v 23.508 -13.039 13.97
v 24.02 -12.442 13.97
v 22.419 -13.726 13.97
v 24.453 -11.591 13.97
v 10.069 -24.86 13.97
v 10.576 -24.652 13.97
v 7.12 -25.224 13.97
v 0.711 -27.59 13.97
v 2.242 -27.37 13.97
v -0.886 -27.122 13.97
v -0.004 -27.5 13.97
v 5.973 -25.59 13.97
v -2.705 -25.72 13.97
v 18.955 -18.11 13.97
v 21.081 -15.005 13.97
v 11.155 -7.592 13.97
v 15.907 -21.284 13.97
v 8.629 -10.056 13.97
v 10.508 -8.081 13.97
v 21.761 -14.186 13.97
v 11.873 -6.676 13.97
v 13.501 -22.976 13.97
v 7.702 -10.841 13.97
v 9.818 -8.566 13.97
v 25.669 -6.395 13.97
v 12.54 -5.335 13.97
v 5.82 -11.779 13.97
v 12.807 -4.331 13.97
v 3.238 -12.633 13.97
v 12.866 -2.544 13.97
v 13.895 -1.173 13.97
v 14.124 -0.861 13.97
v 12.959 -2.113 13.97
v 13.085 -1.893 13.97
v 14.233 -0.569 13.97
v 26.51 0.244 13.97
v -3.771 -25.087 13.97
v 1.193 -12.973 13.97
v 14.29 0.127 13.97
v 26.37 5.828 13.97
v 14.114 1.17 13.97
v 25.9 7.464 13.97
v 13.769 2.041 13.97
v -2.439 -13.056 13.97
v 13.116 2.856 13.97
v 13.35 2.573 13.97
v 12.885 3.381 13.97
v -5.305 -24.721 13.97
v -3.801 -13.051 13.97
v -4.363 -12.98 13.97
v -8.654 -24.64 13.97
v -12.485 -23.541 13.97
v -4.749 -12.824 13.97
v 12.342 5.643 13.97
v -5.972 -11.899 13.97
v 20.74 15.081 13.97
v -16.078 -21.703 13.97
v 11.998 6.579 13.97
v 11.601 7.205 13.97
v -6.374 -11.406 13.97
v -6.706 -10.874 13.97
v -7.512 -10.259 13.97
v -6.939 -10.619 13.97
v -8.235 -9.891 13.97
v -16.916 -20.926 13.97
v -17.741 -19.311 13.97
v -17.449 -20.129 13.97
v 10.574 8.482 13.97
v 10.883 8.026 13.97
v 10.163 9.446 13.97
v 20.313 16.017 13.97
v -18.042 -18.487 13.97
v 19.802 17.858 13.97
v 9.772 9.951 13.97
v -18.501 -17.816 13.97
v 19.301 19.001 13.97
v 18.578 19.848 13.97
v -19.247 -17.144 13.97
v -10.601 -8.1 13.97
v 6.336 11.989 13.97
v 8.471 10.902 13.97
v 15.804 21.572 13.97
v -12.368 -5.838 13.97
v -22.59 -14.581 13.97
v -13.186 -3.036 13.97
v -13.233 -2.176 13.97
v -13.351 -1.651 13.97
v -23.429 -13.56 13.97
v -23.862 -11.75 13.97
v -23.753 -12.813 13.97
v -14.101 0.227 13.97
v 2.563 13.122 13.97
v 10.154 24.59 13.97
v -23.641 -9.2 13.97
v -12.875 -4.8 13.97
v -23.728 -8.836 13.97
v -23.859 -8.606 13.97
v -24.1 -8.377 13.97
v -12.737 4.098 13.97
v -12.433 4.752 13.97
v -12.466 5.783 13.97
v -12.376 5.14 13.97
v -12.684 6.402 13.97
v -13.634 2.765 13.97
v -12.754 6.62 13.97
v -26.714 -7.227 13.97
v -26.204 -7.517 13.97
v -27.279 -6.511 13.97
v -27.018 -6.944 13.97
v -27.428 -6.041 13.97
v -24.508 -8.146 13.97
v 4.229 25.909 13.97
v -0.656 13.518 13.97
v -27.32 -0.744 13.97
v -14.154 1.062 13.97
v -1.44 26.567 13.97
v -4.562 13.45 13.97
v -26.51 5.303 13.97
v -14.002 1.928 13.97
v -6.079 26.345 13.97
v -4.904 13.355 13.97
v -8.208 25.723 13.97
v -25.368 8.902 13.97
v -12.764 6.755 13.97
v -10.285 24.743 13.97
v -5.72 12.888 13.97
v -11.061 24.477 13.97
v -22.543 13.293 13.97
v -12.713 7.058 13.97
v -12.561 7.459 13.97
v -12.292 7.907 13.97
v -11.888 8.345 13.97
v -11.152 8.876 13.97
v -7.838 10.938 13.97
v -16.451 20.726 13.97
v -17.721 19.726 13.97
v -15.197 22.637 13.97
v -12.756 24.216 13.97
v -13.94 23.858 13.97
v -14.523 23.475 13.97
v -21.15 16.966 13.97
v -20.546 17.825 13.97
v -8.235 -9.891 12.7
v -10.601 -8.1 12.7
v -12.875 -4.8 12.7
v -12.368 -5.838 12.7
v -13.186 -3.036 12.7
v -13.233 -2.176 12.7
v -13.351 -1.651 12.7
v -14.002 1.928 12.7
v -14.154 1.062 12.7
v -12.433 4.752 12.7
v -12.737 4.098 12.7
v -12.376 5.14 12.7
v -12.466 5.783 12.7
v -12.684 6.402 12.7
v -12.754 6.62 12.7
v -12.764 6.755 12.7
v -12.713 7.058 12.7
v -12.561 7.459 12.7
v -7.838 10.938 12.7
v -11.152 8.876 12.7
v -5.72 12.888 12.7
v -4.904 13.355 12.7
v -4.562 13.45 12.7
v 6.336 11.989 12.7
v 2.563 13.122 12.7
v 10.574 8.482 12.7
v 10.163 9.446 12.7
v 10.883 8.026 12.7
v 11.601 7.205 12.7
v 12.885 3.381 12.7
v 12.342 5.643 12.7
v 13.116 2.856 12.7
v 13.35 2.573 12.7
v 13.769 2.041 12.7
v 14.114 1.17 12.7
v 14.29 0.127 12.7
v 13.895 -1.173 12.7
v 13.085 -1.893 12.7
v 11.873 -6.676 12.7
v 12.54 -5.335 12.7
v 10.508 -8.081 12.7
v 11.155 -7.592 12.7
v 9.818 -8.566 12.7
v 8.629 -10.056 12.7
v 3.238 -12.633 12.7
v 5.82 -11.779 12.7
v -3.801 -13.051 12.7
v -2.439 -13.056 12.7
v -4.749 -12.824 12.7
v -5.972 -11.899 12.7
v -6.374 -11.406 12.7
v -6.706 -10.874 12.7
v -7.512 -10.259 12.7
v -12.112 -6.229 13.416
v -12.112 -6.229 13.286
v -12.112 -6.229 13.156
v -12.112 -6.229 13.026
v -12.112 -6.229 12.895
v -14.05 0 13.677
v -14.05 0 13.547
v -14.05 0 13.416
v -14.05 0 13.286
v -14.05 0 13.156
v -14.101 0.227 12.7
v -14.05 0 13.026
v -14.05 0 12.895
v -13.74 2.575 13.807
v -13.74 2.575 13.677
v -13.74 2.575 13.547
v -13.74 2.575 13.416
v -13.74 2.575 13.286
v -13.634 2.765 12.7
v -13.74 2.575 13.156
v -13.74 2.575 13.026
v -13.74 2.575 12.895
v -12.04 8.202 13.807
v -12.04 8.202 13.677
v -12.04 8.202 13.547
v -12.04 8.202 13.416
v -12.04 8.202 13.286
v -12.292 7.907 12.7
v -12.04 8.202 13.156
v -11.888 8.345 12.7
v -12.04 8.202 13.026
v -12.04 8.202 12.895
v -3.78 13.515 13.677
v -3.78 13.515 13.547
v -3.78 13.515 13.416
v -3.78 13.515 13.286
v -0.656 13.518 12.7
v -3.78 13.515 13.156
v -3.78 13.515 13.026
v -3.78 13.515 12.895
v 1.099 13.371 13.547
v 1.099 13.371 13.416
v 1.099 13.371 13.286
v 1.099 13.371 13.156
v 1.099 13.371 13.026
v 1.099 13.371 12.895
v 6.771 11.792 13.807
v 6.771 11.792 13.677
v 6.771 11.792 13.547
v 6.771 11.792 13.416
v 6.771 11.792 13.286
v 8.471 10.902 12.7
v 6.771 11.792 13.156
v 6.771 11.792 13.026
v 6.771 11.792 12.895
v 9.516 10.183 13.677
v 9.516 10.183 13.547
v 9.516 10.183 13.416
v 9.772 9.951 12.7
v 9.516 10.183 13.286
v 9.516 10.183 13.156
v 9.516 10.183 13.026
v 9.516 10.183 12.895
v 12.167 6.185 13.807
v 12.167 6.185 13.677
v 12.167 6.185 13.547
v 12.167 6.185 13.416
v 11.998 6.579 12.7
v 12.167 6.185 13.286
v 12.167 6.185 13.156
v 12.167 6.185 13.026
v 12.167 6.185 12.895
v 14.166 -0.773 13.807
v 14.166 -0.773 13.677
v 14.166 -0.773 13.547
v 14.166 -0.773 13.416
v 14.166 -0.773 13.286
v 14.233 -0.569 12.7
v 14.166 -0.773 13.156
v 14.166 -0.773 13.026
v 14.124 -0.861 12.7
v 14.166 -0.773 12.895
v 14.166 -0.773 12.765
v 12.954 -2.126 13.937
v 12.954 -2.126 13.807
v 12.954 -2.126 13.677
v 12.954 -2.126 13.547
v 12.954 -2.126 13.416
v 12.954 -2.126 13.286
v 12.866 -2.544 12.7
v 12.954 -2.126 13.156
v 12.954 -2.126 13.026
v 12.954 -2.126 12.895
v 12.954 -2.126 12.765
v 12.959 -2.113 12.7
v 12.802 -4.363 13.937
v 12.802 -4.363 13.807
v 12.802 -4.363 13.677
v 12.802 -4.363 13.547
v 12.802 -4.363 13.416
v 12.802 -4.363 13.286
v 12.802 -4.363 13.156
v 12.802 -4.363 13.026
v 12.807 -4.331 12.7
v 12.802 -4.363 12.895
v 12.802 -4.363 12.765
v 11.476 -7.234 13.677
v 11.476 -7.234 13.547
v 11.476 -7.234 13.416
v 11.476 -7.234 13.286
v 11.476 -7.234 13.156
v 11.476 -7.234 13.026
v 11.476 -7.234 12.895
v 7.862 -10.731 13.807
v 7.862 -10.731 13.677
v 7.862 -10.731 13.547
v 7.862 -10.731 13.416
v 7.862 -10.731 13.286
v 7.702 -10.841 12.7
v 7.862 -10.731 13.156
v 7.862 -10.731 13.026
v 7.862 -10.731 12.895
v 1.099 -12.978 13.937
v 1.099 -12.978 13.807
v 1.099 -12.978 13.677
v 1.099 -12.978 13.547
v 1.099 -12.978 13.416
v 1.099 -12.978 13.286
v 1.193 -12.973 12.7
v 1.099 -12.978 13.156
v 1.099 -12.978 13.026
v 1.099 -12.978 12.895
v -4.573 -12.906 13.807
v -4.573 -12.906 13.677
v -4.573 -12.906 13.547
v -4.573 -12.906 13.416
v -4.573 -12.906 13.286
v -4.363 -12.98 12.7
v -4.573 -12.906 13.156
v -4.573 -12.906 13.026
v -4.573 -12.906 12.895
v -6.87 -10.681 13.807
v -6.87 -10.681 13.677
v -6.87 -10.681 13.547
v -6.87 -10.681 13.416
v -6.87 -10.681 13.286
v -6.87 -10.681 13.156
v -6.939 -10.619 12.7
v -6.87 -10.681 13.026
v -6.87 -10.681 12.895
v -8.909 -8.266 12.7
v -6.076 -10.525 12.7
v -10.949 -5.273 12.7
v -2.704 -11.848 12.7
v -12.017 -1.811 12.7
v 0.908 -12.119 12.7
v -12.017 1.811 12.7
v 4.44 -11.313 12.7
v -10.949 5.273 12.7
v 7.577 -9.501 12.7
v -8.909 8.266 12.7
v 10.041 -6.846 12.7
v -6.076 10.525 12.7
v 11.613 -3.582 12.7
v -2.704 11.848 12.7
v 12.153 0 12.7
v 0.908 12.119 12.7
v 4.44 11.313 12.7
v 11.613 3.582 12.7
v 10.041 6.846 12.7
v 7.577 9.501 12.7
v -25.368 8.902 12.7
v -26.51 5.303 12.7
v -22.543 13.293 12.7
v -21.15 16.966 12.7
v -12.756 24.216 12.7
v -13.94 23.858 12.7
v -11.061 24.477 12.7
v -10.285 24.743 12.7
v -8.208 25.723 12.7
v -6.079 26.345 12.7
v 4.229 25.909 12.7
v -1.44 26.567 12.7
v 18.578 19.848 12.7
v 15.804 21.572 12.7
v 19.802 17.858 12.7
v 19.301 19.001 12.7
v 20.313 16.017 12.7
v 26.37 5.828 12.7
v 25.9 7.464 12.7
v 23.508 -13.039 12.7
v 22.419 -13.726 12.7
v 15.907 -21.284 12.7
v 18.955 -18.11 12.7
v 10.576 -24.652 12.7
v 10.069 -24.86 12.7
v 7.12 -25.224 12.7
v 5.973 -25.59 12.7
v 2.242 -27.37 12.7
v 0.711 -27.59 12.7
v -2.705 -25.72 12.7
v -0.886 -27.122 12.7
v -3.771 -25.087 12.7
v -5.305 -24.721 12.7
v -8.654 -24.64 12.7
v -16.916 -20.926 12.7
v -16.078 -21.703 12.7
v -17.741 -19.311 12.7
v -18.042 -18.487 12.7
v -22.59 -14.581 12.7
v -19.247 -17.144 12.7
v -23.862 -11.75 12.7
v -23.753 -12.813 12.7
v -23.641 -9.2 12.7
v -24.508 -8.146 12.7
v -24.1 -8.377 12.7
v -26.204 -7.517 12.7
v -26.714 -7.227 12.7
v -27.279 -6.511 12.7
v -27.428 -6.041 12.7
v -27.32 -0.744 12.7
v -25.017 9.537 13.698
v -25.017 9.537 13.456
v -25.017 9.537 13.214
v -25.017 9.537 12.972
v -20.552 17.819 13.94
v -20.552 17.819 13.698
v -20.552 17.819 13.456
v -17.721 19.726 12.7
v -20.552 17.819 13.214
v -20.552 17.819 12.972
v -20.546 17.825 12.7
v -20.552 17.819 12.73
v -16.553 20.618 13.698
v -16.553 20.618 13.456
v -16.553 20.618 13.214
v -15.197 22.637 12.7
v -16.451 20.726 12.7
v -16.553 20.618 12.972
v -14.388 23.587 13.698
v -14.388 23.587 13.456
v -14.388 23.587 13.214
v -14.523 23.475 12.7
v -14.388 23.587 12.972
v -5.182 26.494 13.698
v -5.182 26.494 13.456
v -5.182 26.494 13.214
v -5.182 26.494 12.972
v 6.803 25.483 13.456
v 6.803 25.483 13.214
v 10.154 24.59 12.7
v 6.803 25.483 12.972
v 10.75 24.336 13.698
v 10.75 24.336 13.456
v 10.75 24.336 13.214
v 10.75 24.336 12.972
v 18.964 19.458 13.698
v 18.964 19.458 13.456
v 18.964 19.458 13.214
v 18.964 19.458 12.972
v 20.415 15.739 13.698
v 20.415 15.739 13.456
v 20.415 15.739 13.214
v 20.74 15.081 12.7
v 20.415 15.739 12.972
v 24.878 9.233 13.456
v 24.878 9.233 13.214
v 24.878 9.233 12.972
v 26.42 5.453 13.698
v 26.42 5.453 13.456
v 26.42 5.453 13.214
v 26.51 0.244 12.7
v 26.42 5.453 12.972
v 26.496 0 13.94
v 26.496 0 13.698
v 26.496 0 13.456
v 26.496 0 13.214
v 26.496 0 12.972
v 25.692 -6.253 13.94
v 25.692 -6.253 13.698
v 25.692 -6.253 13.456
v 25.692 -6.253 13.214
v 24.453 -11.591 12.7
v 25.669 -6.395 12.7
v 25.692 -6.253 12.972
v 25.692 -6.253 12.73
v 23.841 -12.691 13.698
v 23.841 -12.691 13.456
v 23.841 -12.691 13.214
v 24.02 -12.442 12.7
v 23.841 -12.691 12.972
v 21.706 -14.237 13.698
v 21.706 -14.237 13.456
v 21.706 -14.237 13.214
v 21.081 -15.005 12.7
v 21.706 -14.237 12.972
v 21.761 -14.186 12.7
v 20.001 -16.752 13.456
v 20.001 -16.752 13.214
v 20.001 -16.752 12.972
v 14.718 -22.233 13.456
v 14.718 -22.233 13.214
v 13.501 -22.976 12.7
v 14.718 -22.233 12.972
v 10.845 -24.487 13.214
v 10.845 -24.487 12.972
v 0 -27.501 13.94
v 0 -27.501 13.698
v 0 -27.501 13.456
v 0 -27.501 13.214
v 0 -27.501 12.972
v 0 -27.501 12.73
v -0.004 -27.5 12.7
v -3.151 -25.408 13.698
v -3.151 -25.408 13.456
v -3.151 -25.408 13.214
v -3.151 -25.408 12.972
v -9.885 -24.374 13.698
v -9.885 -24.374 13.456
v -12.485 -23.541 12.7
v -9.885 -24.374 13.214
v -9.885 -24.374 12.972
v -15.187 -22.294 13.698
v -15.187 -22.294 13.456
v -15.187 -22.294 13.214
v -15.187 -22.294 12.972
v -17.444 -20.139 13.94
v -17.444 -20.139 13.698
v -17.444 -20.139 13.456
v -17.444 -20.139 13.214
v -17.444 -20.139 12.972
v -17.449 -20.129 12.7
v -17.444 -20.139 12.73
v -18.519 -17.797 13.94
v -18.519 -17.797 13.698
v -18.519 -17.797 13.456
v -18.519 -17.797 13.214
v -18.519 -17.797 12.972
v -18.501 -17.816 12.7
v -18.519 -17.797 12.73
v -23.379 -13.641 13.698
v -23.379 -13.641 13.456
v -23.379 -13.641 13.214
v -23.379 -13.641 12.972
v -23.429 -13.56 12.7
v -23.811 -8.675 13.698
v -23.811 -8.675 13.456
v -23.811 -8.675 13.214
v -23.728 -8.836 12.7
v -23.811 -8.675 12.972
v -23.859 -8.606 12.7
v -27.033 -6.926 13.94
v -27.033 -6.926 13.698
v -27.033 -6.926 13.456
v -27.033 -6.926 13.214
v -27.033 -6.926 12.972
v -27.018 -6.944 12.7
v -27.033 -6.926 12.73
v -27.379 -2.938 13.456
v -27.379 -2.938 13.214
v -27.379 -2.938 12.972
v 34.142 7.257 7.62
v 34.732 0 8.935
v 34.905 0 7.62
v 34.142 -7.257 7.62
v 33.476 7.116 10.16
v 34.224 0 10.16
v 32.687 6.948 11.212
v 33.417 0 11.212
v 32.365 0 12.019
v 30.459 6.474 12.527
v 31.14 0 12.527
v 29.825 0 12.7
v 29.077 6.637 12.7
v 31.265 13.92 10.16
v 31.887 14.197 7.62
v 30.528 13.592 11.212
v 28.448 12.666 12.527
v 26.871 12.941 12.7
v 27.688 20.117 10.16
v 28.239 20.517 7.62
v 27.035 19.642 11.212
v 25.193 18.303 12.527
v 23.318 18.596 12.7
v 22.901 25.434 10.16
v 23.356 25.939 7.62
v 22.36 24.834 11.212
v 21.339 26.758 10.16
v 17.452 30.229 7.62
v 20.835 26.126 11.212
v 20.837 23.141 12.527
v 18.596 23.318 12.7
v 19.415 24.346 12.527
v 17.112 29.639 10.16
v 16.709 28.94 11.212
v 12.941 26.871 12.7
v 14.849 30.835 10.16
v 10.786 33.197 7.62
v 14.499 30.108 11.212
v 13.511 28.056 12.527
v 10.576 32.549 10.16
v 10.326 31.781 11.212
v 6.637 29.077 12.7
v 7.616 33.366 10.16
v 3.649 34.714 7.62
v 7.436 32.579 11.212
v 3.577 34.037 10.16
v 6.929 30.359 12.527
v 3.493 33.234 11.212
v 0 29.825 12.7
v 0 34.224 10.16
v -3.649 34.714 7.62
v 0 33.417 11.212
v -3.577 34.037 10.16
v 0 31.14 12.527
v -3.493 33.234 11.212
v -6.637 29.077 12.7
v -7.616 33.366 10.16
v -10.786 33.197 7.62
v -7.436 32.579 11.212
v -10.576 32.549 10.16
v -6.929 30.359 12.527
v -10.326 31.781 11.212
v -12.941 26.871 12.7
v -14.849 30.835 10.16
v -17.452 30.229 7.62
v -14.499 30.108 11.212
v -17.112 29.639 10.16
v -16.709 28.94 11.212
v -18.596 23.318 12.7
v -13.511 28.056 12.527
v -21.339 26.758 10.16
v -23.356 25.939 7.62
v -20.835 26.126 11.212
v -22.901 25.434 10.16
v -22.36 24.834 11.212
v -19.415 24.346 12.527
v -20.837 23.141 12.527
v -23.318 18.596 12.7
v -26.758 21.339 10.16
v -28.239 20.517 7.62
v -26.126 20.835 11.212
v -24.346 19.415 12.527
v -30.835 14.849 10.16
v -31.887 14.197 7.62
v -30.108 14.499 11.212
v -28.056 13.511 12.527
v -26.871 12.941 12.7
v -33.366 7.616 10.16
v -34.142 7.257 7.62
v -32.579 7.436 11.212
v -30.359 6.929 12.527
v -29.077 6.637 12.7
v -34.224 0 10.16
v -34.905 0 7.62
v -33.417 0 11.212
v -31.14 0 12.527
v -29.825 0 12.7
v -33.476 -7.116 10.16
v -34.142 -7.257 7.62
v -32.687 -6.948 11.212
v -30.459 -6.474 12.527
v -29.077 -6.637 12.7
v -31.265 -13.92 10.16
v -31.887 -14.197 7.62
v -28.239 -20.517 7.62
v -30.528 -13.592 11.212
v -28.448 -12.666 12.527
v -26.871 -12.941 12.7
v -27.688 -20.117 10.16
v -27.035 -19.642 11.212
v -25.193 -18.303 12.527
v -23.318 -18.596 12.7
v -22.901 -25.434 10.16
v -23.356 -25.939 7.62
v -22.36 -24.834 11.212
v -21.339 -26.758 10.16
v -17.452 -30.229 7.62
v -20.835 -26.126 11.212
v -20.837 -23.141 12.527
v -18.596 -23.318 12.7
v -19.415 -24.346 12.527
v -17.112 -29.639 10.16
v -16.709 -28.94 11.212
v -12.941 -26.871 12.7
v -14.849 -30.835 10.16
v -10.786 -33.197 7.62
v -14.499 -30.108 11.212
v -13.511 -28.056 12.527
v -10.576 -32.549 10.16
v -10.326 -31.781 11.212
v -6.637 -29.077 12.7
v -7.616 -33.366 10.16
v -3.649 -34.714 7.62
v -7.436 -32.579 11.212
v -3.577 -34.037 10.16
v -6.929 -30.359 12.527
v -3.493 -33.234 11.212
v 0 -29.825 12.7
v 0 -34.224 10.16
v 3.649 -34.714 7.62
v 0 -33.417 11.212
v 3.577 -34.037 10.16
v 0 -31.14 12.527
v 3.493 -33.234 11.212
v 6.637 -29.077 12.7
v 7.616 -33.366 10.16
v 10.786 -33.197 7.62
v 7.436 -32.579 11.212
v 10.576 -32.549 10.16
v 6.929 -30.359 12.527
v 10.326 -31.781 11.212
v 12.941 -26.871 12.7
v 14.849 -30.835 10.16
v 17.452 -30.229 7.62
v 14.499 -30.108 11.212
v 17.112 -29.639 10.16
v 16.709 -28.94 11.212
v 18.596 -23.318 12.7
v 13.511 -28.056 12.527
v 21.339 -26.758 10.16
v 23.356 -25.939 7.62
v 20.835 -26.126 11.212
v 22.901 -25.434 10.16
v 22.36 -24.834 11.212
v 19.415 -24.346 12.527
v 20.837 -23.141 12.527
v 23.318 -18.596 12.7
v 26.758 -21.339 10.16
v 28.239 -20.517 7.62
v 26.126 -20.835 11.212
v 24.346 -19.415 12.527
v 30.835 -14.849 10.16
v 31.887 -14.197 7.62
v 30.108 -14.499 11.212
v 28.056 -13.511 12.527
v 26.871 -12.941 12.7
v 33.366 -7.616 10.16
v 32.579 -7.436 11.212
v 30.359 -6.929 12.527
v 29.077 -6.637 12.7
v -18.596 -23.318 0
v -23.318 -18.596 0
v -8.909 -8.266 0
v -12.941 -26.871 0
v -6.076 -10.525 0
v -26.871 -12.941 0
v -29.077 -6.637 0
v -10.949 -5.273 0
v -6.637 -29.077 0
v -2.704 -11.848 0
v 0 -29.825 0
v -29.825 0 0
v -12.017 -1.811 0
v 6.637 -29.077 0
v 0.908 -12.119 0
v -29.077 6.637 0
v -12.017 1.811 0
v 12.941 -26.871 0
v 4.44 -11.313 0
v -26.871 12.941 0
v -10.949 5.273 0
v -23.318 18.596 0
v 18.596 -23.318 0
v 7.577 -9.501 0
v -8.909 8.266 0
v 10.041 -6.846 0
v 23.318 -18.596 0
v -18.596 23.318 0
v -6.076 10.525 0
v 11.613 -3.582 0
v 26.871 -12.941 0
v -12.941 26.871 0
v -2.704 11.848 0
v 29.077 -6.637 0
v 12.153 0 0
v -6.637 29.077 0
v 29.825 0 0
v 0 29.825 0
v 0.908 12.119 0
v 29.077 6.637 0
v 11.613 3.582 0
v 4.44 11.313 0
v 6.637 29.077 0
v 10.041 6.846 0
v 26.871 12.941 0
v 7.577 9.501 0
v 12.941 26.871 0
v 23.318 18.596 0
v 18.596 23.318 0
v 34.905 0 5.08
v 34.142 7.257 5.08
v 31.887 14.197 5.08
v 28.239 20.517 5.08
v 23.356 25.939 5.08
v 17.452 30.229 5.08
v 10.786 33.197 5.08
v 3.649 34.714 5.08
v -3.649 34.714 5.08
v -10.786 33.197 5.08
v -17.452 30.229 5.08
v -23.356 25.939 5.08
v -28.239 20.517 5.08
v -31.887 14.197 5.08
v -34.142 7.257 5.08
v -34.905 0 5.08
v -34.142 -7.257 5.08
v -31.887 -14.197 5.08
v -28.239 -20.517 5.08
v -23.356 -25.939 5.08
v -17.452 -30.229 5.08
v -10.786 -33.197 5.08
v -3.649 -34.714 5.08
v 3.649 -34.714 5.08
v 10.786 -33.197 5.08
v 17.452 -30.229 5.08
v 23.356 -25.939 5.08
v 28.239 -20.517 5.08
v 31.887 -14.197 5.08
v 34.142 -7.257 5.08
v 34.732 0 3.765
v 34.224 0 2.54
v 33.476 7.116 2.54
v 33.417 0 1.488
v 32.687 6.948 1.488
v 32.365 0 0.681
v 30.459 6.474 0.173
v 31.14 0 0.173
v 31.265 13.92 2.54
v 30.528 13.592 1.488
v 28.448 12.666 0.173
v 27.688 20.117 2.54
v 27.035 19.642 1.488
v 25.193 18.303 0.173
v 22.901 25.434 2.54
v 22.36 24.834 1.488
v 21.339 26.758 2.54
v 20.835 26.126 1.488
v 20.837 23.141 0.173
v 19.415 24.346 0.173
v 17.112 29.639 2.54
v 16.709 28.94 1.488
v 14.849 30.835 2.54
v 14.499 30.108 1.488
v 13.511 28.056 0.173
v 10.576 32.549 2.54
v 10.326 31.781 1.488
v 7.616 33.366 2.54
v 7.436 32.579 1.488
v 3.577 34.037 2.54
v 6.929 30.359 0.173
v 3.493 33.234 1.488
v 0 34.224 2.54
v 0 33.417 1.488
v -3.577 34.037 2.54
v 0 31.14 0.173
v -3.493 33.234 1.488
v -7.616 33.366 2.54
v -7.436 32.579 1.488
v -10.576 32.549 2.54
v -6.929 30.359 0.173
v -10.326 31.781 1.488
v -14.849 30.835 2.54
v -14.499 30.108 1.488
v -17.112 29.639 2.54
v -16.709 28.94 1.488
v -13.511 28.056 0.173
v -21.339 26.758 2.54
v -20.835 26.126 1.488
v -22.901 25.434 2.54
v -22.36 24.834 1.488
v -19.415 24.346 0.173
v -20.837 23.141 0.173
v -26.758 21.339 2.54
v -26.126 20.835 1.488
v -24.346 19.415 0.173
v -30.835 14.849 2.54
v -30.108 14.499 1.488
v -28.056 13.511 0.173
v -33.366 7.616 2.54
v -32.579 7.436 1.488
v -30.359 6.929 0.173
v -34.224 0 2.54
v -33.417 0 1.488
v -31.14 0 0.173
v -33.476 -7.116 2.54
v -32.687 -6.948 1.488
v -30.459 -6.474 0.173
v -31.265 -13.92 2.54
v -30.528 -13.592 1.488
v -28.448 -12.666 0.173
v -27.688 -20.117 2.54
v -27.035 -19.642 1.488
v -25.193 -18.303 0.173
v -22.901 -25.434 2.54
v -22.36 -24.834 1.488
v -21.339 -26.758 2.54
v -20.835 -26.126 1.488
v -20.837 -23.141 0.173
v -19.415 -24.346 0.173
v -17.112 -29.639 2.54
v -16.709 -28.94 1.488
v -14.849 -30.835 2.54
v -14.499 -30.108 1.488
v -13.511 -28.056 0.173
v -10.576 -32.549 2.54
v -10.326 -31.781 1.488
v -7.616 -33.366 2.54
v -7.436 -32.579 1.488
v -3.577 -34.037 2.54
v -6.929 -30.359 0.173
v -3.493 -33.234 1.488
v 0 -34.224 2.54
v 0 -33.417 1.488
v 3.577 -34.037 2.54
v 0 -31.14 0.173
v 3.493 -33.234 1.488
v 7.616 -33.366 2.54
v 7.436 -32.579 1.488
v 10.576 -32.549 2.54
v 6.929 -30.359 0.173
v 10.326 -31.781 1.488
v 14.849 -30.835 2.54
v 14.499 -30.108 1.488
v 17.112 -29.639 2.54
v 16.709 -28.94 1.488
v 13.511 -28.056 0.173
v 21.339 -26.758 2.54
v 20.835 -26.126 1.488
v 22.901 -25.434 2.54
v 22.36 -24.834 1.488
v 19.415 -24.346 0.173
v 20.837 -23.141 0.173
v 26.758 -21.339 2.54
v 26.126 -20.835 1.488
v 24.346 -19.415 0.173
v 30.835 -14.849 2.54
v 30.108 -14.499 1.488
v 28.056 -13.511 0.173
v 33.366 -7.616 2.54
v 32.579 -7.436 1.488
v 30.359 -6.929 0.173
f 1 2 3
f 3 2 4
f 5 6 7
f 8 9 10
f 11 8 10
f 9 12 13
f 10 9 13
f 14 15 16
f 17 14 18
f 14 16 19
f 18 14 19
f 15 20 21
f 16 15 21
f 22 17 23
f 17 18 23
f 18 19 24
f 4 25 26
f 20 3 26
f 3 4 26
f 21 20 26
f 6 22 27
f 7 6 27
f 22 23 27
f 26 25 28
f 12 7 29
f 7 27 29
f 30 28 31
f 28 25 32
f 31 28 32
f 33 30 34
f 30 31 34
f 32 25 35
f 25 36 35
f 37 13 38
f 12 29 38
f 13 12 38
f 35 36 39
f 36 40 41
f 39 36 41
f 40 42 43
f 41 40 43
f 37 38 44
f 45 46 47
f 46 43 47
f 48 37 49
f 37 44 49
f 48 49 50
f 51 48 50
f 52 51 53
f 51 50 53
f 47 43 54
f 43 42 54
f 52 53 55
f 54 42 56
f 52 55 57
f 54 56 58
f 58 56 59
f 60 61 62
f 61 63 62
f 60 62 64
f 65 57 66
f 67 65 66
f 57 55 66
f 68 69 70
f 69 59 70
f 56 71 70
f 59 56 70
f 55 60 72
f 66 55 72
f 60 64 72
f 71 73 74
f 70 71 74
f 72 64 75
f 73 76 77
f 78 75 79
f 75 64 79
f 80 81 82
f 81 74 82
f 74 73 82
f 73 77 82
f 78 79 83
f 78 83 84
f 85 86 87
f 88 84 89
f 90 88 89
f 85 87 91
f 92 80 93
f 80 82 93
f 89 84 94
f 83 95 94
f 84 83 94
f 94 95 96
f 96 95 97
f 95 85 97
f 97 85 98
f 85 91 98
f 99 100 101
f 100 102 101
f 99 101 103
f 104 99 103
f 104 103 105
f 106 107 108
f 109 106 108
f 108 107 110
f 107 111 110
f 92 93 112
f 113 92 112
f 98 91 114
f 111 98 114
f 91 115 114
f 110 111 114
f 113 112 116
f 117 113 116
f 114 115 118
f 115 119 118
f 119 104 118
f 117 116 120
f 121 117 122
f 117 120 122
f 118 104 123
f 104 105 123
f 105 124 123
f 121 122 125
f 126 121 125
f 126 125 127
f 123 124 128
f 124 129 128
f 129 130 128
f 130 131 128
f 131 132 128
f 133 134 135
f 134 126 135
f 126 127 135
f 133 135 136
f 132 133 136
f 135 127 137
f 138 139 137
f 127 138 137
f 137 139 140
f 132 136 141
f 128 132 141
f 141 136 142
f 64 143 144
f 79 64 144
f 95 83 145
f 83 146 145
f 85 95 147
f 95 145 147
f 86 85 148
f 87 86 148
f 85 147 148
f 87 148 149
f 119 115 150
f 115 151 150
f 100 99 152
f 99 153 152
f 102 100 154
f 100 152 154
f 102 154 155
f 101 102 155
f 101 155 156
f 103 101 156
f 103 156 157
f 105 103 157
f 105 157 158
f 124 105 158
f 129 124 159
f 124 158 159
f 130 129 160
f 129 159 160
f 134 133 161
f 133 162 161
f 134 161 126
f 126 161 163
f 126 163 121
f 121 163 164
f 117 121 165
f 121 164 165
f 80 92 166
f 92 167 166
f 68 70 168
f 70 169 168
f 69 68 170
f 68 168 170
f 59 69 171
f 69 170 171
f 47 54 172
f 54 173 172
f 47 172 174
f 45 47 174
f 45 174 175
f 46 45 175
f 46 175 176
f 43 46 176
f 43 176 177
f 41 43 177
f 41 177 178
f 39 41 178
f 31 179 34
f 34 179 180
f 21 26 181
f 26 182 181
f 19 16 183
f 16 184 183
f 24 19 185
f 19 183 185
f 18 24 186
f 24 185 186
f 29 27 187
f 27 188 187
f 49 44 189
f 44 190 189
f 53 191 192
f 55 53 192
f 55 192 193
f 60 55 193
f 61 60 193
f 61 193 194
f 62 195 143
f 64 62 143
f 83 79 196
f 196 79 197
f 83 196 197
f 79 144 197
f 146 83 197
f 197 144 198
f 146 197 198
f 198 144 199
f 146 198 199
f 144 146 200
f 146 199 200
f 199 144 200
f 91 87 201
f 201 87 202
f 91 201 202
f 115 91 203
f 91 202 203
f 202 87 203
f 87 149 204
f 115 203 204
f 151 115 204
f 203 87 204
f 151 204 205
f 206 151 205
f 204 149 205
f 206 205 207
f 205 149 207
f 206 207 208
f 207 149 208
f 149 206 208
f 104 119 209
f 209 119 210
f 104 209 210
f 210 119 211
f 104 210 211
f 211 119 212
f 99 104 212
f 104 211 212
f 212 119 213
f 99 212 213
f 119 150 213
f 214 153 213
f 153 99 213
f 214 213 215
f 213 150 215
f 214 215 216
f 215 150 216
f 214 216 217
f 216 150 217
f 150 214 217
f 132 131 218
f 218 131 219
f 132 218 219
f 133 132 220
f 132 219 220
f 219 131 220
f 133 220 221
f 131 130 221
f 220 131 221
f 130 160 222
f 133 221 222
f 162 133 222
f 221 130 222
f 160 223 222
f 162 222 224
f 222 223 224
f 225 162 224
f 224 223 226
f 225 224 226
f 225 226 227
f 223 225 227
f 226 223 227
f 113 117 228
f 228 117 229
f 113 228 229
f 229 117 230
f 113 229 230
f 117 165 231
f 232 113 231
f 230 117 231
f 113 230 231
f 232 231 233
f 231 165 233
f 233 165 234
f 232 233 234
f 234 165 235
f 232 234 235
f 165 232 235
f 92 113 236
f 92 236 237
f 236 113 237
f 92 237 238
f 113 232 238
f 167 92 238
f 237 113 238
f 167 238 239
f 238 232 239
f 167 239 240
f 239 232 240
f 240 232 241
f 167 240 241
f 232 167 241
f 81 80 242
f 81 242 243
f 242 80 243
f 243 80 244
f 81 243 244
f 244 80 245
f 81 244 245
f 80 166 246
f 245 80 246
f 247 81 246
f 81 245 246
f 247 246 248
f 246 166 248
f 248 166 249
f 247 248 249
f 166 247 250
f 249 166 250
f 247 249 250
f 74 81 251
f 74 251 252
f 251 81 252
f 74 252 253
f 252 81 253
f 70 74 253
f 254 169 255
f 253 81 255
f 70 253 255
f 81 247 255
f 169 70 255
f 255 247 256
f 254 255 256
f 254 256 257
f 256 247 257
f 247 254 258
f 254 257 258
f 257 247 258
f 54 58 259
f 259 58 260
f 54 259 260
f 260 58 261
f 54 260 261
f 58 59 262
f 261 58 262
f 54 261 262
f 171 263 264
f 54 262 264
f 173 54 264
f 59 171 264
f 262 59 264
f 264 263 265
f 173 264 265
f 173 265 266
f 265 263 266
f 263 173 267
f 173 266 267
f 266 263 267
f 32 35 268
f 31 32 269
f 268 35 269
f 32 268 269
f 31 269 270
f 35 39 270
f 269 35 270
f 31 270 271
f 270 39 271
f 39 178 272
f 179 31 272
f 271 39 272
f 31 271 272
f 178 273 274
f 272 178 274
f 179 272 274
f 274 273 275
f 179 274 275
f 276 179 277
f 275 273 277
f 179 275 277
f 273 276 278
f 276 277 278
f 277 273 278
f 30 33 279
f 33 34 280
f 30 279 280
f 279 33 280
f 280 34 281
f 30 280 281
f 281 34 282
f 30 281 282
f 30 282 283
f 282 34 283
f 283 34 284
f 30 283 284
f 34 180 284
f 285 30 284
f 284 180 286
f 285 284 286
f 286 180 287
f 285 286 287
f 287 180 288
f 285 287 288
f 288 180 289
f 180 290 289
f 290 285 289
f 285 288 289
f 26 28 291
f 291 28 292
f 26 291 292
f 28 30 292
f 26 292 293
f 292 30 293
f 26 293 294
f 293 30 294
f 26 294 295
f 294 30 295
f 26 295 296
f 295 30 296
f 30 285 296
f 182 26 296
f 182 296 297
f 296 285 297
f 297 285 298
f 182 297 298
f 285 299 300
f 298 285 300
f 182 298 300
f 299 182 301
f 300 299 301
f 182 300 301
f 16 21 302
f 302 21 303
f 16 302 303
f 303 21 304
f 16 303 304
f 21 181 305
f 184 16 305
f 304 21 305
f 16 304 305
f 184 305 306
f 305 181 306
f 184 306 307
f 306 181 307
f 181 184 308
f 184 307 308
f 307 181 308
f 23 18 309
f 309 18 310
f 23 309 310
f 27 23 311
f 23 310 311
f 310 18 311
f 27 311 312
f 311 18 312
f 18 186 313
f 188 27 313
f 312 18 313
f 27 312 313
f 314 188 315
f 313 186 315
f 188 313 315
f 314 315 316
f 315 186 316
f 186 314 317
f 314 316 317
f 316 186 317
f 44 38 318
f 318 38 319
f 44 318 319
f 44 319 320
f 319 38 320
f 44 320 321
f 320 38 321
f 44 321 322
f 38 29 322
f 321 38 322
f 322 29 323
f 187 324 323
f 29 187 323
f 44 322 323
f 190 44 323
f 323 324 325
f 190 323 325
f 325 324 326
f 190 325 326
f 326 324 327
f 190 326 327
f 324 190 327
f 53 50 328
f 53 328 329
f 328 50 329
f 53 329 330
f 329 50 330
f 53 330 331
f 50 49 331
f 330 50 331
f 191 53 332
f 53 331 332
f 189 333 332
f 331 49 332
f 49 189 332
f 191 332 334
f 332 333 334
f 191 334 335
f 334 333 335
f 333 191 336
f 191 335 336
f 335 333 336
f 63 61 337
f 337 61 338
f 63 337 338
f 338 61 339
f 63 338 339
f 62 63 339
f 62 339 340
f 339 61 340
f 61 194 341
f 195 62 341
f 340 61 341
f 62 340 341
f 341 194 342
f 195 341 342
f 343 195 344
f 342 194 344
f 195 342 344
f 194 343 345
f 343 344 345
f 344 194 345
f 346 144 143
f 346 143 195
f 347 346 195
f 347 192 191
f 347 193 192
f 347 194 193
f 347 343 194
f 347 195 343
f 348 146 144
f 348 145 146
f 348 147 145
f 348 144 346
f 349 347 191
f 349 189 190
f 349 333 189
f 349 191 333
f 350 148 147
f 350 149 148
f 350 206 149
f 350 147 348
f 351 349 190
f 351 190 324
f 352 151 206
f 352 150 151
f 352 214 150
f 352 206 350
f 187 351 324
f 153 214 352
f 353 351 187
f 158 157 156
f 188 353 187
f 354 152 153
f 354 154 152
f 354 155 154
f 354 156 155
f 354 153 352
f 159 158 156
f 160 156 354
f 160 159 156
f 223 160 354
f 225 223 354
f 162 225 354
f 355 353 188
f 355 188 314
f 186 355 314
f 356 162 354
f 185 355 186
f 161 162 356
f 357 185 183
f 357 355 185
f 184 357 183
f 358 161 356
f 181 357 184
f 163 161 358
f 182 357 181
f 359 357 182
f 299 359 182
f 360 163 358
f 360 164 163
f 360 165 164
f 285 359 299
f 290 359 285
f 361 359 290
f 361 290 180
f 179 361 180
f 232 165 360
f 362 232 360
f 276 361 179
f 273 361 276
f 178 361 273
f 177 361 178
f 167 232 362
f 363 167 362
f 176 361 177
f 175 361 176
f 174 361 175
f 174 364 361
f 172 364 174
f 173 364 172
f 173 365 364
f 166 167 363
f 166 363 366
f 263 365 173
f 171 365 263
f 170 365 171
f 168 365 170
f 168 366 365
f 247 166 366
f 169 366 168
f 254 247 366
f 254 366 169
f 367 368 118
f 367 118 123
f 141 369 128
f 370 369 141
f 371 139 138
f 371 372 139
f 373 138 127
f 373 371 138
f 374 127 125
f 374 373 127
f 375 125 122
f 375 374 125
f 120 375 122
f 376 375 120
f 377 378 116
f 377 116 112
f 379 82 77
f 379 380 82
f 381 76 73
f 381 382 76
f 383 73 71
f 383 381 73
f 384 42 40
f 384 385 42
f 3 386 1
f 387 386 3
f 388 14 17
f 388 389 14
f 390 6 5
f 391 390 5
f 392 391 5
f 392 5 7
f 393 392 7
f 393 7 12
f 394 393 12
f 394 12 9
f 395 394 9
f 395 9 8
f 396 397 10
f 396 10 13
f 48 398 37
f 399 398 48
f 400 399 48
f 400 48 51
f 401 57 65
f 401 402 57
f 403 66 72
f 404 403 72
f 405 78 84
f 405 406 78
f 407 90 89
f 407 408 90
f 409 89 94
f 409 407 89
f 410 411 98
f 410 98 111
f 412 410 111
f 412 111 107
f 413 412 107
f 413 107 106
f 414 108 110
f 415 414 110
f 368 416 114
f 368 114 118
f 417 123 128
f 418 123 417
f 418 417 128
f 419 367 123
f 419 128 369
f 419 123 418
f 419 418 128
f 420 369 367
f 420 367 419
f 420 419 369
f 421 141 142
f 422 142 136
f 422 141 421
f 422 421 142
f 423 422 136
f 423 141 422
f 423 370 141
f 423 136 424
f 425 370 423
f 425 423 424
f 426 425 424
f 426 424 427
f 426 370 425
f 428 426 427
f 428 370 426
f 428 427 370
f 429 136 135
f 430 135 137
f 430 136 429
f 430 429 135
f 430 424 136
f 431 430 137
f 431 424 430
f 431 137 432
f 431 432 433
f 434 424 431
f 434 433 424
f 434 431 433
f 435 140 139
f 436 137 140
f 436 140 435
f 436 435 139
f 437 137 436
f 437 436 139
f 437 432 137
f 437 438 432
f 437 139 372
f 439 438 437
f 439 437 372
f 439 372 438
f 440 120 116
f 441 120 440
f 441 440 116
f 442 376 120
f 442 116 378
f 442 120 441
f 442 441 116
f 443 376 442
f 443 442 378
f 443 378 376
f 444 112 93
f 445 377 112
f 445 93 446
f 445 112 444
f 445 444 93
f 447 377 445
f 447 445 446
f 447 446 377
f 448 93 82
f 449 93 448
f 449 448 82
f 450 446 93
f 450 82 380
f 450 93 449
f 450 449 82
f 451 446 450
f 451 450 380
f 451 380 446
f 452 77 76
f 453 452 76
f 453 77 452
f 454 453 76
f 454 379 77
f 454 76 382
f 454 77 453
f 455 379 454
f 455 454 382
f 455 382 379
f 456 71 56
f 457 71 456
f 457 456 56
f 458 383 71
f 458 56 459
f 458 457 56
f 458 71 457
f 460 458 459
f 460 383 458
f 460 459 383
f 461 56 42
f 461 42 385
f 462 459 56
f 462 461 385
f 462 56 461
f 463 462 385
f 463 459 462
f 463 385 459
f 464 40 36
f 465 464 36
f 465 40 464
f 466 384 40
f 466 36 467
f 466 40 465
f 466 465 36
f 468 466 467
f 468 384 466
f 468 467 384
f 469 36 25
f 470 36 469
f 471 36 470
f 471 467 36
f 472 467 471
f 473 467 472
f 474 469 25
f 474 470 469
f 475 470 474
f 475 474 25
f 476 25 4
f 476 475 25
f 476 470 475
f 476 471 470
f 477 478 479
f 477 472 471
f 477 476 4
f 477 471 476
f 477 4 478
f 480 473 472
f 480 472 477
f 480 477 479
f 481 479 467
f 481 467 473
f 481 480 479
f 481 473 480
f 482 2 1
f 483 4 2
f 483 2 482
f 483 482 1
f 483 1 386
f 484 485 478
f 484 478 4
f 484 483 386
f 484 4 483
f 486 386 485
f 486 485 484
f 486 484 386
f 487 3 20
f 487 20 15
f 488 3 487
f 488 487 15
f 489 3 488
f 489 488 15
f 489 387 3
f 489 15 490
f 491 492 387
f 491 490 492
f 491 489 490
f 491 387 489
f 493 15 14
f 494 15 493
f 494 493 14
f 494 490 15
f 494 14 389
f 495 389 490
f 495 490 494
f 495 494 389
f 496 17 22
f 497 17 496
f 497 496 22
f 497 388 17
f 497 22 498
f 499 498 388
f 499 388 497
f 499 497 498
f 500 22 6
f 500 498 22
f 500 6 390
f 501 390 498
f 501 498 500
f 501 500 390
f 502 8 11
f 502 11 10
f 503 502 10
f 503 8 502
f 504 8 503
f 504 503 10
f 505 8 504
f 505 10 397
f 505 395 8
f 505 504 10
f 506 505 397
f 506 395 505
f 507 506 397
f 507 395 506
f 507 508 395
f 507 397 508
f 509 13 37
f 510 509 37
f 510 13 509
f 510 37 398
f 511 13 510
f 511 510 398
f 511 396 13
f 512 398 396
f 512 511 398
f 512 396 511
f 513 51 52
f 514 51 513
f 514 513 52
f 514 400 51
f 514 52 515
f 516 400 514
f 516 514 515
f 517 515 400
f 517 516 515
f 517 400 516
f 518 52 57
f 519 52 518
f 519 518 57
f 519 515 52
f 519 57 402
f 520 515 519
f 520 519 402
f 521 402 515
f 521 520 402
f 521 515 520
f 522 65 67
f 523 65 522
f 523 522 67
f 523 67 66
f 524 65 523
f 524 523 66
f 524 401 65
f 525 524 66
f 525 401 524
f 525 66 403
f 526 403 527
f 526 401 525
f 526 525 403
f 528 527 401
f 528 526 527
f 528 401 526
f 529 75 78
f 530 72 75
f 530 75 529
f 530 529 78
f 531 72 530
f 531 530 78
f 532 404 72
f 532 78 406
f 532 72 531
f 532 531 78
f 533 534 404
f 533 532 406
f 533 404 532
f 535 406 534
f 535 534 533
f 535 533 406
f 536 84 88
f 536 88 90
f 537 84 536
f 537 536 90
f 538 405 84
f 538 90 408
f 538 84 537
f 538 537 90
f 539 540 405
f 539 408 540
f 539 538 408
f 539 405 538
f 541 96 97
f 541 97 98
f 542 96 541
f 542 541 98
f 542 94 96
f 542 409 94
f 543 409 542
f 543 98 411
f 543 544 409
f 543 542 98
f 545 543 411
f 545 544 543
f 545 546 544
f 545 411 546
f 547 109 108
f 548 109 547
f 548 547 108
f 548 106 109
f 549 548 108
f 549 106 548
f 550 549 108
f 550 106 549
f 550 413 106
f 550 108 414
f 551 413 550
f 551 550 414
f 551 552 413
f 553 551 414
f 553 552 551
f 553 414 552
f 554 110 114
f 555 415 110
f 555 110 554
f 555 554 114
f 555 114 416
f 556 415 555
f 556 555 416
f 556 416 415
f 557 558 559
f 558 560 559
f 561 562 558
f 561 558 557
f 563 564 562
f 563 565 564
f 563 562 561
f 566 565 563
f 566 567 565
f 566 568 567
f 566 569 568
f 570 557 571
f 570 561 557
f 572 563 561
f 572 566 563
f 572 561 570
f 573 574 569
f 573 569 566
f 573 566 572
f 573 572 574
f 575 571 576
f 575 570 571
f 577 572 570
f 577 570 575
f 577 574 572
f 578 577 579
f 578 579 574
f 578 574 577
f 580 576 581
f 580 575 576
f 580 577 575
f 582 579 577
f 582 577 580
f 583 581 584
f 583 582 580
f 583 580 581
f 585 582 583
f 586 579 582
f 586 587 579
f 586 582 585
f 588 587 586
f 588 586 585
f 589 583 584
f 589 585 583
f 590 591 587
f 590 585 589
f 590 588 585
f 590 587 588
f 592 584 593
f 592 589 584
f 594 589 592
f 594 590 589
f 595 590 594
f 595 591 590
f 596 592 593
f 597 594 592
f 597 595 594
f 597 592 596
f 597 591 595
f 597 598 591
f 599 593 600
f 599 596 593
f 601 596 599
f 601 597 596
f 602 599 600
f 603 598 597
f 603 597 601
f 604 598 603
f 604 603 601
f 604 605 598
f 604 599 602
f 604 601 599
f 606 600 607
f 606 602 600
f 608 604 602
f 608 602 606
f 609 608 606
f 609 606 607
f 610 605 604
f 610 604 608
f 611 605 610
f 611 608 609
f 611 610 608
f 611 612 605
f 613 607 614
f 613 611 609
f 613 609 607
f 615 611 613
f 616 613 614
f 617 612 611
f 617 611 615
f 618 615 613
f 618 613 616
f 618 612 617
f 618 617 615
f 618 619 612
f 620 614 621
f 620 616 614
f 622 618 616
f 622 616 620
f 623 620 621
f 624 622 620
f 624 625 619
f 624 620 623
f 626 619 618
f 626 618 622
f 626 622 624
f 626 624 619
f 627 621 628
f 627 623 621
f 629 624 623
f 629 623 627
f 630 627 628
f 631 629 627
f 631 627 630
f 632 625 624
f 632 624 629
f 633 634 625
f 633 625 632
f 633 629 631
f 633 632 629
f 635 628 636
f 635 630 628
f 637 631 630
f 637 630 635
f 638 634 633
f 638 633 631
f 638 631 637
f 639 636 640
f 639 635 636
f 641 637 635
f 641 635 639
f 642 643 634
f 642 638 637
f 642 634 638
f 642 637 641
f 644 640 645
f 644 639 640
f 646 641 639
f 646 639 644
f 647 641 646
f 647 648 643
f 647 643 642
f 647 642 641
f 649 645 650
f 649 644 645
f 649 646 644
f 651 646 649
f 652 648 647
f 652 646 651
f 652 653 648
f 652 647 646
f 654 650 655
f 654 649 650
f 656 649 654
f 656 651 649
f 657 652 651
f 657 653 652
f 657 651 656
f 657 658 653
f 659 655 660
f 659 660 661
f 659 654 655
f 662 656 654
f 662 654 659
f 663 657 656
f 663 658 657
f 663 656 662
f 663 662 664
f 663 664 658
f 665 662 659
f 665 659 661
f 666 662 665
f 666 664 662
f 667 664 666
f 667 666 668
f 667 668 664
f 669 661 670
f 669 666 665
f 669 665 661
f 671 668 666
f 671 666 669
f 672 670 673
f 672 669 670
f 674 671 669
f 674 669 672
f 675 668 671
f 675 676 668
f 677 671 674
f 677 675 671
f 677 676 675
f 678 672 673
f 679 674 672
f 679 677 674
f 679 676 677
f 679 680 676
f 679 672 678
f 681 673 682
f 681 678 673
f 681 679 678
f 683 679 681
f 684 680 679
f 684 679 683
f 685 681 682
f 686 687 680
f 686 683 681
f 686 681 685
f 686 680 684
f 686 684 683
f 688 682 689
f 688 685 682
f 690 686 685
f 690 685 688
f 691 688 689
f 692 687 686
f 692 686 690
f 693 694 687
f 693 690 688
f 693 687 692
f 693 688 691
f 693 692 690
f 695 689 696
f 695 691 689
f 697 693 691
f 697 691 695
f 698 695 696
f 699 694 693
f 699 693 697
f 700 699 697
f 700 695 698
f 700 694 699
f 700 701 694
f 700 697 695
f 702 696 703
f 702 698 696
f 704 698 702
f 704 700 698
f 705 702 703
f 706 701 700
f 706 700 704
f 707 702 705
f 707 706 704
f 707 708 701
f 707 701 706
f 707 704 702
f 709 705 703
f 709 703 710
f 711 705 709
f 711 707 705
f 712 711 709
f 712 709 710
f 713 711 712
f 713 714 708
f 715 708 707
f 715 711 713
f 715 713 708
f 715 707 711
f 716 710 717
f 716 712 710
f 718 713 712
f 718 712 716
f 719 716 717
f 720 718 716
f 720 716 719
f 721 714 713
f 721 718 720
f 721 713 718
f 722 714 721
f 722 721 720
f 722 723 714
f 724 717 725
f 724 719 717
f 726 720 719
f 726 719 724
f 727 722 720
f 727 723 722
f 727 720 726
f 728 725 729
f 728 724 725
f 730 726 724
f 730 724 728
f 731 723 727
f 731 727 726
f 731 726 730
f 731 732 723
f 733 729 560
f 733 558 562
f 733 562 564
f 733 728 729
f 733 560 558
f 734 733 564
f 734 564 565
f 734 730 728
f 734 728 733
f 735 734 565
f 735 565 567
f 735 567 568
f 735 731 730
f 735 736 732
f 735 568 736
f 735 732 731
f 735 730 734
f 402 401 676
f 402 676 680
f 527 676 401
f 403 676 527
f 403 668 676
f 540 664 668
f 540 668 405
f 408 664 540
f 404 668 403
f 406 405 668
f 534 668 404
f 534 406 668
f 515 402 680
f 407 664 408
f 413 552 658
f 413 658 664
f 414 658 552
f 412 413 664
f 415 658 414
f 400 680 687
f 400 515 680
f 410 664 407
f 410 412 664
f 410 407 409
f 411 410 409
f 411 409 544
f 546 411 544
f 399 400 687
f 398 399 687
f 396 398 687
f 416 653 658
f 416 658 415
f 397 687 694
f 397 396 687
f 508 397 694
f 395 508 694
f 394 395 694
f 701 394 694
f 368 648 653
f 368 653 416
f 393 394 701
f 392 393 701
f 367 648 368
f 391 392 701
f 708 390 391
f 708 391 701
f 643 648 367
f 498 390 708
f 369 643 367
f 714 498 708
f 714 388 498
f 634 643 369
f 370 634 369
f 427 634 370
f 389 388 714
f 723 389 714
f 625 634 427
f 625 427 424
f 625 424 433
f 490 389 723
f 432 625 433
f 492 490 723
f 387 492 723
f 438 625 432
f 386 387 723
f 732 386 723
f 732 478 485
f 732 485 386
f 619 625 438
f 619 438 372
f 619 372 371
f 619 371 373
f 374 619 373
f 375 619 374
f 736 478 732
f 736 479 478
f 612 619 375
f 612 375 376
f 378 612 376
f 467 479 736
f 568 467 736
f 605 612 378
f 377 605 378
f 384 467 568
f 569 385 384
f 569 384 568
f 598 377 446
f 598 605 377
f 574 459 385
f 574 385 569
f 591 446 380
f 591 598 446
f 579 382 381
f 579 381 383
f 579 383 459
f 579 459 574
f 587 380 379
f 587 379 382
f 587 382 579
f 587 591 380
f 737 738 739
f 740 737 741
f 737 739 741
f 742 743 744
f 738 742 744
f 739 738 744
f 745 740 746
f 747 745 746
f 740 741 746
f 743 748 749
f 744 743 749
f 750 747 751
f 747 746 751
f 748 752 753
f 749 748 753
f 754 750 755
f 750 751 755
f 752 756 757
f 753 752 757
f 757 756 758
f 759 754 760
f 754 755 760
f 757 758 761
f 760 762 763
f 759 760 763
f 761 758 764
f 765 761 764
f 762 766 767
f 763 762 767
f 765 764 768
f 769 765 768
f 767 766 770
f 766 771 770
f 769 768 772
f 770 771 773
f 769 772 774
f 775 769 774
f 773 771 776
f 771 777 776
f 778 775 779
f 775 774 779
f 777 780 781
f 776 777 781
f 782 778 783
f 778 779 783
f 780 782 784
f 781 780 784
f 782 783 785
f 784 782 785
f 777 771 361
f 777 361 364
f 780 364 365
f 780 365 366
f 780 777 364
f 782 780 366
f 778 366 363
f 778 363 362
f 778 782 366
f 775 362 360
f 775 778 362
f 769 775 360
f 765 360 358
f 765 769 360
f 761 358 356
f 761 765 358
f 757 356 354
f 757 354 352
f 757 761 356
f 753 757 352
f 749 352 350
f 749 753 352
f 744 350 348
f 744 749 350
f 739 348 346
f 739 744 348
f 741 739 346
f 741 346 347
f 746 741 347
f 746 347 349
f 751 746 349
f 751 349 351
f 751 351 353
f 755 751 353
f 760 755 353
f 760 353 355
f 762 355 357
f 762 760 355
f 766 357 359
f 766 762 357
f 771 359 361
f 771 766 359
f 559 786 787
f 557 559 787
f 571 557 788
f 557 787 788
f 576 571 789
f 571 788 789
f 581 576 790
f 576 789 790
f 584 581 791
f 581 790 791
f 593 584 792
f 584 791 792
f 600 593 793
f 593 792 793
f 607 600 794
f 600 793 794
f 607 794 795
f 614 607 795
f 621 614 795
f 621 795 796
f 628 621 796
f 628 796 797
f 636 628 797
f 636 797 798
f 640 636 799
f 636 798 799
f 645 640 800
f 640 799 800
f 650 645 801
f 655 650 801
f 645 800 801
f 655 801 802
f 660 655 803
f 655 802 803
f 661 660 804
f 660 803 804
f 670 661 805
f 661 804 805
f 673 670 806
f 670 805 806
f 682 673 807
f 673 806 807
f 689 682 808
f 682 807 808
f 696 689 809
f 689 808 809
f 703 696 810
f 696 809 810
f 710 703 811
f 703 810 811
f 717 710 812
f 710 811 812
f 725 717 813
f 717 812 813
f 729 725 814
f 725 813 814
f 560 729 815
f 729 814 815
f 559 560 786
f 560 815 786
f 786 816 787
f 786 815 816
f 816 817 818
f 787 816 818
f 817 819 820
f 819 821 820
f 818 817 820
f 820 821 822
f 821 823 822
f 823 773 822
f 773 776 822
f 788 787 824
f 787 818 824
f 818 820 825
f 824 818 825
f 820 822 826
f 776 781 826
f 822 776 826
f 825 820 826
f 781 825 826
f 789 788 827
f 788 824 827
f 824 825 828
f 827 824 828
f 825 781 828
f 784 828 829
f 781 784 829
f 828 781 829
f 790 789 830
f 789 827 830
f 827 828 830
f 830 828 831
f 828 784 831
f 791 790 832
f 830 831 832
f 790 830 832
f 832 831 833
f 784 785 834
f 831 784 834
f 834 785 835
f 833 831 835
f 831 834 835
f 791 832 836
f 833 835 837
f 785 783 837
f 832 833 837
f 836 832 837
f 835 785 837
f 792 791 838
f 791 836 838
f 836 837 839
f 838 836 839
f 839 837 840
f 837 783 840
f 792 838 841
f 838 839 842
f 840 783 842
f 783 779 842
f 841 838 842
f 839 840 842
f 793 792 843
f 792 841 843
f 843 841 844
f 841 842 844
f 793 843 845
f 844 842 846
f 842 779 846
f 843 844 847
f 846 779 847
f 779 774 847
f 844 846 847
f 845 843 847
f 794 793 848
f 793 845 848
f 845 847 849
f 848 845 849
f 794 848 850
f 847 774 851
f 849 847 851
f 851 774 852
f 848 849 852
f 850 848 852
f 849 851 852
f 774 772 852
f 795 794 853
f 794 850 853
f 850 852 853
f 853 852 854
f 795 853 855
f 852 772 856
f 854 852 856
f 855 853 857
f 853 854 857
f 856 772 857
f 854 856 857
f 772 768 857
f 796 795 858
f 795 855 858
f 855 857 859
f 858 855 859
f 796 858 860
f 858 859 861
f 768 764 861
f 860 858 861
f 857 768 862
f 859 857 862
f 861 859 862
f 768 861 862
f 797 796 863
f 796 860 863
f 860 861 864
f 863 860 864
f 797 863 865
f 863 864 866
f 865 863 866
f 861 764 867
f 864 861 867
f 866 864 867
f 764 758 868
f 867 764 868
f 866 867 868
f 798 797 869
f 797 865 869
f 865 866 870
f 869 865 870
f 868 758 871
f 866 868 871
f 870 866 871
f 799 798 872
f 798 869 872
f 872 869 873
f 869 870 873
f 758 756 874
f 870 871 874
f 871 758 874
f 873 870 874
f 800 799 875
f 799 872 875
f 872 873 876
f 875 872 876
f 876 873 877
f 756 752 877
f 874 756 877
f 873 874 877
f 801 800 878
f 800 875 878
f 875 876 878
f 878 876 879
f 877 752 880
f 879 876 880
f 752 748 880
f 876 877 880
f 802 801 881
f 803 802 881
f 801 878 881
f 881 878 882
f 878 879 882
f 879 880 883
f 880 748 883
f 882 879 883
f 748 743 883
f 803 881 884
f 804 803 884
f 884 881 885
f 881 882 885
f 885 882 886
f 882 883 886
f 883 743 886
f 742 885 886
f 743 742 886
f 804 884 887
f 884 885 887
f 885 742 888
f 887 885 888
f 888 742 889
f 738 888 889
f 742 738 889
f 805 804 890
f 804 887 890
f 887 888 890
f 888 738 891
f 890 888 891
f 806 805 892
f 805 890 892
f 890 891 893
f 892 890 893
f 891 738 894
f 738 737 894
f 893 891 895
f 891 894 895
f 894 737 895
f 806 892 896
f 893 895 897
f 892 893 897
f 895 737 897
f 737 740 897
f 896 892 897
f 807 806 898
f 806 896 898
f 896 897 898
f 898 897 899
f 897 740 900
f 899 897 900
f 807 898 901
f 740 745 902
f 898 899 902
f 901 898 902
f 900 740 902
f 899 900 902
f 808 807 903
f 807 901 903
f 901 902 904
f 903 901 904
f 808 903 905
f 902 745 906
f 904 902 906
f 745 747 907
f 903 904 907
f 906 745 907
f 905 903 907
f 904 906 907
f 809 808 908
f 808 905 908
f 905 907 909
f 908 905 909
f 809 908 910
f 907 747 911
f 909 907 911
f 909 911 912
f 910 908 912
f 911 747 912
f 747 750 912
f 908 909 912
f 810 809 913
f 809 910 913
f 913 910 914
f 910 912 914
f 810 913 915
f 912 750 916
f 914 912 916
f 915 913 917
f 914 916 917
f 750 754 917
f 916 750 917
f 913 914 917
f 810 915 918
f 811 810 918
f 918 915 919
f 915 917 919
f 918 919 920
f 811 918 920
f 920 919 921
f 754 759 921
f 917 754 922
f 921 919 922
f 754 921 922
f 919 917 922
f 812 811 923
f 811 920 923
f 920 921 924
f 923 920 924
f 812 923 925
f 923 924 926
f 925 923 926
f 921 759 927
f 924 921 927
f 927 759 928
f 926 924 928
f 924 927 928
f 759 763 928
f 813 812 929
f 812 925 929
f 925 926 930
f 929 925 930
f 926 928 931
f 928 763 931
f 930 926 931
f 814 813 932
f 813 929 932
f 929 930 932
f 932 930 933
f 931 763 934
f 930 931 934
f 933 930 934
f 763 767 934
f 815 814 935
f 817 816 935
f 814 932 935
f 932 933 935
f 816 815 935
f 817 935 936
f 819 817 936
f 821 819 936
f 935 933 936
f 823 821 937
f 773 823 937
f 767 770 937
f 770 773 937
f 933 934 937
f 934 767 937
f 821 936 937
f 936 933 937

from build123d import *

# Parameters (mm, degrees)
F0_R     = 34.9048984543
F0_R_2   = 12.1527980699
F1_DEPTH = 12.7
F2_R     = 5.08
F4_DEPTH = 1.27


with BuildPart() as f1:
    # F0 (on Top) → F1 (new body)
    with BuildSketch(Plane.XY):
        Circle(F0_R)
        Circle(F0_R_2, mode=Mode.SUBTRACT)
    extrude(amount=F1_DEPTH)

    # F2
    f2_edges = [f1.edges().sort_by_distance(p)[0] for p in [
        (-34.904898, 0, 12.7),
        (-34.904898, 0, 0),
    ]]
    fillet(f2_edges, radius=F2_R)

    # F3 (on face) → F4 (join)
    with BuildSketch(Plane.XY.offset(12.7)):
        with BuildLine():
            add(Edge.make_bspline(
                [(-26.5100551654, 5.3025482653), (-26.1775777626, 6.8846169353), (-25.426195352, 9.5585165622), (-21.9599620725, 13.2508842839), (-21.4252105627, 18.3671331529), (-15.9727257648, 20.0075396378), (-14.9639394482, 24.2717931622), (-10.9251498531, 24.302647067), (-9.6494450341, 25.1539680098), (-5.0619142731, 27.1501426479), (2.9364188774, 26.116961143), (6.7036171526, 25.5379932802), (10.6573871921, 24.6835871523), (14.7573917291, 21.9289202724), (19.8180312275, 19.7593649997), (20.0754768641, 15.508502344), (22.3122742945, 13.2150420094), (24.8687428198, 9.2649676537), (26.236280157, 7.0748050493), (26.5683677316, 4.4839498923), (26.6193868693, -0.2692160734), (25.7996004959, -5.6893312188), (24.5512615162, -13.1987913778), (21.578184924, -13.7490691282), (20.0764117368, -16.9529506973), (17.9606986403, -19.178065747), (14.9930384746, -22.4425316877), (11.3987416677, -23.930893903), (10.2145760957, -25.1338947759), (6.5252356299, -24.9949833096), (4.5608388803, -26.5977986597), (-0.3282395602, -28.505967202), (-3.0228034633, -24.8122338538), (-6.5203870216, -24.6024105997), (-8.5916996145, -24.949725655), (-15.4151885755, -22.6854209451), (-17.8056764162, -20.1002806496), (-17.8320100644, -17.3412685699), (-25.5374880979, -13.8491124827), (-22.3203884827, -7.8713385294), (-28.1023951514, -7.8568396436), (-27.2118988499, -2.6878447966), (-27.4462290339, -0.0881844475), (-26.8778790381, 3.5522860815), (-26.5100551654, 5.3025482653)],
                knots=[0, 0, 0, 0, 0.025100786, 0.0515006218, 0.0773255314, 0.1040306197, 0.1273197637, 0.1492832246, 0.164081176, 0.1900751577, 0.2243019929, 0.2479894376, 0.2713402254, 0.2984043621, 0.3255565574, 0.3484870803, 0.3699597782, 0.3959232575, 0.4150270568, 0.4338460561, 0.4595033209, 0.4890200017, 0.5206327041, 0.5394411367, 0.5609391522, 0.5822888361, 0.6076150408, 0.6307996414, 0.6460459422, 0.6677757373, 0.6875397802, 0.7129385858, 0.7369874319, 0.7581334928, 0.7759446845, 0.8076475688, 0.8294756985, 0.8479459894, 0.8797763389, 0.9047748222, 0.9273435385, 0.9516656917, 0.9722306893, 1, 1, 1, 1], degree=3))
        make_face()
        with BuildLine():
            add(Edge.make_bspline(
                [(-8.2345250994, -9.8908804357), (-8.9458392351, -9.5077807042), (-10.4796691233, -8.4184923399), (-12.1360387292, -6.2750376945), (-12.9938535956, -4.8039571077), (-13.2324693915, -2.9931588743), (-13.1757401303, -1.6536349206), (-14.3209037, -0.023337251), (-14.0993769033, 2.6719629583), (-11.9404804521, 4.6761098619), (-12.703481489, 6.405467504), (-12.8270839215, 6.8461358452), (-12.1870236759, 8.6423072838), (-8.3907459178, 10.0632211102), (-6.1838251076, 12.6596780289), (-4.8642778852, 13.4572863575), (-3.6846315329, 13.5327673731), (1.1519526403, 13.6553067722), (5.36757979, 12.383916271), (6.6595896273, 11.8826377743), (10.3183048343, 10.0264907592), (10.4159916441, 8.1984792068), (12.4250757614, 6.8298506824), (12.7447125275, 2.7914965118), (13.9021599523, 2.3617307527), (14.766156634, -1.0990731298), (12.5061772416, -1.7898654847), (13.2624840148, -4.4604368238), (11.2721736916, -7.9077944769), (9.6875825909, -8.3312970087), (8.4885998665, -10.8584573841), (4.4735377468, -12.2892439529), (2.7870594142, -12.7787865045), (1.0875259556, -13.0256788093), (-0.004663569, -12.9438511878), (-1.6958781493, -13.0854122441), (-3.5055324331, -13.0311735162), (-4.594827104, -13.0923767332), (-6.3679345671, -11.6856389284), (-6.7361202326, -10.554745759), (-7.6880893504, -10.1851799276), (-8.2345250994, -9.8908804357)],
                knots=[0, 0, 0, 0, 0.0288870196, 0.057944713, 0.0810043624, 0.1043657751, 0.1245209765, 0.1485684828, 0.1767724173, 0.2059978311, 0.2278954912, 0.2395761953, 0.2615216197, 0.2971537523, 0.3300230686, 0.3505952844, 0.3690190178, 0.4080821431, 0.4449622392, 0.4669432769, 0.5011460234, 0.5235415436, 0.550080748, 0.5838900853, 0.6030704416, 0.6331911008, 0.6560743488, 0.6833370713, 0.7174514504, 0.739055769, 0.7672615976, 0.8032362912, 0.8273677527, 0.8496844786, 0.8682142027, 0.8912773472, 0.9149577274, 0.9333814579, 0.958976503, 0.9778088198, 1, 1, 1, 1], degree=3))
        make_face(mode=Mode.SUBTRACT)
    extrude(amount=F4_DEPTH)


solid = f1.part
